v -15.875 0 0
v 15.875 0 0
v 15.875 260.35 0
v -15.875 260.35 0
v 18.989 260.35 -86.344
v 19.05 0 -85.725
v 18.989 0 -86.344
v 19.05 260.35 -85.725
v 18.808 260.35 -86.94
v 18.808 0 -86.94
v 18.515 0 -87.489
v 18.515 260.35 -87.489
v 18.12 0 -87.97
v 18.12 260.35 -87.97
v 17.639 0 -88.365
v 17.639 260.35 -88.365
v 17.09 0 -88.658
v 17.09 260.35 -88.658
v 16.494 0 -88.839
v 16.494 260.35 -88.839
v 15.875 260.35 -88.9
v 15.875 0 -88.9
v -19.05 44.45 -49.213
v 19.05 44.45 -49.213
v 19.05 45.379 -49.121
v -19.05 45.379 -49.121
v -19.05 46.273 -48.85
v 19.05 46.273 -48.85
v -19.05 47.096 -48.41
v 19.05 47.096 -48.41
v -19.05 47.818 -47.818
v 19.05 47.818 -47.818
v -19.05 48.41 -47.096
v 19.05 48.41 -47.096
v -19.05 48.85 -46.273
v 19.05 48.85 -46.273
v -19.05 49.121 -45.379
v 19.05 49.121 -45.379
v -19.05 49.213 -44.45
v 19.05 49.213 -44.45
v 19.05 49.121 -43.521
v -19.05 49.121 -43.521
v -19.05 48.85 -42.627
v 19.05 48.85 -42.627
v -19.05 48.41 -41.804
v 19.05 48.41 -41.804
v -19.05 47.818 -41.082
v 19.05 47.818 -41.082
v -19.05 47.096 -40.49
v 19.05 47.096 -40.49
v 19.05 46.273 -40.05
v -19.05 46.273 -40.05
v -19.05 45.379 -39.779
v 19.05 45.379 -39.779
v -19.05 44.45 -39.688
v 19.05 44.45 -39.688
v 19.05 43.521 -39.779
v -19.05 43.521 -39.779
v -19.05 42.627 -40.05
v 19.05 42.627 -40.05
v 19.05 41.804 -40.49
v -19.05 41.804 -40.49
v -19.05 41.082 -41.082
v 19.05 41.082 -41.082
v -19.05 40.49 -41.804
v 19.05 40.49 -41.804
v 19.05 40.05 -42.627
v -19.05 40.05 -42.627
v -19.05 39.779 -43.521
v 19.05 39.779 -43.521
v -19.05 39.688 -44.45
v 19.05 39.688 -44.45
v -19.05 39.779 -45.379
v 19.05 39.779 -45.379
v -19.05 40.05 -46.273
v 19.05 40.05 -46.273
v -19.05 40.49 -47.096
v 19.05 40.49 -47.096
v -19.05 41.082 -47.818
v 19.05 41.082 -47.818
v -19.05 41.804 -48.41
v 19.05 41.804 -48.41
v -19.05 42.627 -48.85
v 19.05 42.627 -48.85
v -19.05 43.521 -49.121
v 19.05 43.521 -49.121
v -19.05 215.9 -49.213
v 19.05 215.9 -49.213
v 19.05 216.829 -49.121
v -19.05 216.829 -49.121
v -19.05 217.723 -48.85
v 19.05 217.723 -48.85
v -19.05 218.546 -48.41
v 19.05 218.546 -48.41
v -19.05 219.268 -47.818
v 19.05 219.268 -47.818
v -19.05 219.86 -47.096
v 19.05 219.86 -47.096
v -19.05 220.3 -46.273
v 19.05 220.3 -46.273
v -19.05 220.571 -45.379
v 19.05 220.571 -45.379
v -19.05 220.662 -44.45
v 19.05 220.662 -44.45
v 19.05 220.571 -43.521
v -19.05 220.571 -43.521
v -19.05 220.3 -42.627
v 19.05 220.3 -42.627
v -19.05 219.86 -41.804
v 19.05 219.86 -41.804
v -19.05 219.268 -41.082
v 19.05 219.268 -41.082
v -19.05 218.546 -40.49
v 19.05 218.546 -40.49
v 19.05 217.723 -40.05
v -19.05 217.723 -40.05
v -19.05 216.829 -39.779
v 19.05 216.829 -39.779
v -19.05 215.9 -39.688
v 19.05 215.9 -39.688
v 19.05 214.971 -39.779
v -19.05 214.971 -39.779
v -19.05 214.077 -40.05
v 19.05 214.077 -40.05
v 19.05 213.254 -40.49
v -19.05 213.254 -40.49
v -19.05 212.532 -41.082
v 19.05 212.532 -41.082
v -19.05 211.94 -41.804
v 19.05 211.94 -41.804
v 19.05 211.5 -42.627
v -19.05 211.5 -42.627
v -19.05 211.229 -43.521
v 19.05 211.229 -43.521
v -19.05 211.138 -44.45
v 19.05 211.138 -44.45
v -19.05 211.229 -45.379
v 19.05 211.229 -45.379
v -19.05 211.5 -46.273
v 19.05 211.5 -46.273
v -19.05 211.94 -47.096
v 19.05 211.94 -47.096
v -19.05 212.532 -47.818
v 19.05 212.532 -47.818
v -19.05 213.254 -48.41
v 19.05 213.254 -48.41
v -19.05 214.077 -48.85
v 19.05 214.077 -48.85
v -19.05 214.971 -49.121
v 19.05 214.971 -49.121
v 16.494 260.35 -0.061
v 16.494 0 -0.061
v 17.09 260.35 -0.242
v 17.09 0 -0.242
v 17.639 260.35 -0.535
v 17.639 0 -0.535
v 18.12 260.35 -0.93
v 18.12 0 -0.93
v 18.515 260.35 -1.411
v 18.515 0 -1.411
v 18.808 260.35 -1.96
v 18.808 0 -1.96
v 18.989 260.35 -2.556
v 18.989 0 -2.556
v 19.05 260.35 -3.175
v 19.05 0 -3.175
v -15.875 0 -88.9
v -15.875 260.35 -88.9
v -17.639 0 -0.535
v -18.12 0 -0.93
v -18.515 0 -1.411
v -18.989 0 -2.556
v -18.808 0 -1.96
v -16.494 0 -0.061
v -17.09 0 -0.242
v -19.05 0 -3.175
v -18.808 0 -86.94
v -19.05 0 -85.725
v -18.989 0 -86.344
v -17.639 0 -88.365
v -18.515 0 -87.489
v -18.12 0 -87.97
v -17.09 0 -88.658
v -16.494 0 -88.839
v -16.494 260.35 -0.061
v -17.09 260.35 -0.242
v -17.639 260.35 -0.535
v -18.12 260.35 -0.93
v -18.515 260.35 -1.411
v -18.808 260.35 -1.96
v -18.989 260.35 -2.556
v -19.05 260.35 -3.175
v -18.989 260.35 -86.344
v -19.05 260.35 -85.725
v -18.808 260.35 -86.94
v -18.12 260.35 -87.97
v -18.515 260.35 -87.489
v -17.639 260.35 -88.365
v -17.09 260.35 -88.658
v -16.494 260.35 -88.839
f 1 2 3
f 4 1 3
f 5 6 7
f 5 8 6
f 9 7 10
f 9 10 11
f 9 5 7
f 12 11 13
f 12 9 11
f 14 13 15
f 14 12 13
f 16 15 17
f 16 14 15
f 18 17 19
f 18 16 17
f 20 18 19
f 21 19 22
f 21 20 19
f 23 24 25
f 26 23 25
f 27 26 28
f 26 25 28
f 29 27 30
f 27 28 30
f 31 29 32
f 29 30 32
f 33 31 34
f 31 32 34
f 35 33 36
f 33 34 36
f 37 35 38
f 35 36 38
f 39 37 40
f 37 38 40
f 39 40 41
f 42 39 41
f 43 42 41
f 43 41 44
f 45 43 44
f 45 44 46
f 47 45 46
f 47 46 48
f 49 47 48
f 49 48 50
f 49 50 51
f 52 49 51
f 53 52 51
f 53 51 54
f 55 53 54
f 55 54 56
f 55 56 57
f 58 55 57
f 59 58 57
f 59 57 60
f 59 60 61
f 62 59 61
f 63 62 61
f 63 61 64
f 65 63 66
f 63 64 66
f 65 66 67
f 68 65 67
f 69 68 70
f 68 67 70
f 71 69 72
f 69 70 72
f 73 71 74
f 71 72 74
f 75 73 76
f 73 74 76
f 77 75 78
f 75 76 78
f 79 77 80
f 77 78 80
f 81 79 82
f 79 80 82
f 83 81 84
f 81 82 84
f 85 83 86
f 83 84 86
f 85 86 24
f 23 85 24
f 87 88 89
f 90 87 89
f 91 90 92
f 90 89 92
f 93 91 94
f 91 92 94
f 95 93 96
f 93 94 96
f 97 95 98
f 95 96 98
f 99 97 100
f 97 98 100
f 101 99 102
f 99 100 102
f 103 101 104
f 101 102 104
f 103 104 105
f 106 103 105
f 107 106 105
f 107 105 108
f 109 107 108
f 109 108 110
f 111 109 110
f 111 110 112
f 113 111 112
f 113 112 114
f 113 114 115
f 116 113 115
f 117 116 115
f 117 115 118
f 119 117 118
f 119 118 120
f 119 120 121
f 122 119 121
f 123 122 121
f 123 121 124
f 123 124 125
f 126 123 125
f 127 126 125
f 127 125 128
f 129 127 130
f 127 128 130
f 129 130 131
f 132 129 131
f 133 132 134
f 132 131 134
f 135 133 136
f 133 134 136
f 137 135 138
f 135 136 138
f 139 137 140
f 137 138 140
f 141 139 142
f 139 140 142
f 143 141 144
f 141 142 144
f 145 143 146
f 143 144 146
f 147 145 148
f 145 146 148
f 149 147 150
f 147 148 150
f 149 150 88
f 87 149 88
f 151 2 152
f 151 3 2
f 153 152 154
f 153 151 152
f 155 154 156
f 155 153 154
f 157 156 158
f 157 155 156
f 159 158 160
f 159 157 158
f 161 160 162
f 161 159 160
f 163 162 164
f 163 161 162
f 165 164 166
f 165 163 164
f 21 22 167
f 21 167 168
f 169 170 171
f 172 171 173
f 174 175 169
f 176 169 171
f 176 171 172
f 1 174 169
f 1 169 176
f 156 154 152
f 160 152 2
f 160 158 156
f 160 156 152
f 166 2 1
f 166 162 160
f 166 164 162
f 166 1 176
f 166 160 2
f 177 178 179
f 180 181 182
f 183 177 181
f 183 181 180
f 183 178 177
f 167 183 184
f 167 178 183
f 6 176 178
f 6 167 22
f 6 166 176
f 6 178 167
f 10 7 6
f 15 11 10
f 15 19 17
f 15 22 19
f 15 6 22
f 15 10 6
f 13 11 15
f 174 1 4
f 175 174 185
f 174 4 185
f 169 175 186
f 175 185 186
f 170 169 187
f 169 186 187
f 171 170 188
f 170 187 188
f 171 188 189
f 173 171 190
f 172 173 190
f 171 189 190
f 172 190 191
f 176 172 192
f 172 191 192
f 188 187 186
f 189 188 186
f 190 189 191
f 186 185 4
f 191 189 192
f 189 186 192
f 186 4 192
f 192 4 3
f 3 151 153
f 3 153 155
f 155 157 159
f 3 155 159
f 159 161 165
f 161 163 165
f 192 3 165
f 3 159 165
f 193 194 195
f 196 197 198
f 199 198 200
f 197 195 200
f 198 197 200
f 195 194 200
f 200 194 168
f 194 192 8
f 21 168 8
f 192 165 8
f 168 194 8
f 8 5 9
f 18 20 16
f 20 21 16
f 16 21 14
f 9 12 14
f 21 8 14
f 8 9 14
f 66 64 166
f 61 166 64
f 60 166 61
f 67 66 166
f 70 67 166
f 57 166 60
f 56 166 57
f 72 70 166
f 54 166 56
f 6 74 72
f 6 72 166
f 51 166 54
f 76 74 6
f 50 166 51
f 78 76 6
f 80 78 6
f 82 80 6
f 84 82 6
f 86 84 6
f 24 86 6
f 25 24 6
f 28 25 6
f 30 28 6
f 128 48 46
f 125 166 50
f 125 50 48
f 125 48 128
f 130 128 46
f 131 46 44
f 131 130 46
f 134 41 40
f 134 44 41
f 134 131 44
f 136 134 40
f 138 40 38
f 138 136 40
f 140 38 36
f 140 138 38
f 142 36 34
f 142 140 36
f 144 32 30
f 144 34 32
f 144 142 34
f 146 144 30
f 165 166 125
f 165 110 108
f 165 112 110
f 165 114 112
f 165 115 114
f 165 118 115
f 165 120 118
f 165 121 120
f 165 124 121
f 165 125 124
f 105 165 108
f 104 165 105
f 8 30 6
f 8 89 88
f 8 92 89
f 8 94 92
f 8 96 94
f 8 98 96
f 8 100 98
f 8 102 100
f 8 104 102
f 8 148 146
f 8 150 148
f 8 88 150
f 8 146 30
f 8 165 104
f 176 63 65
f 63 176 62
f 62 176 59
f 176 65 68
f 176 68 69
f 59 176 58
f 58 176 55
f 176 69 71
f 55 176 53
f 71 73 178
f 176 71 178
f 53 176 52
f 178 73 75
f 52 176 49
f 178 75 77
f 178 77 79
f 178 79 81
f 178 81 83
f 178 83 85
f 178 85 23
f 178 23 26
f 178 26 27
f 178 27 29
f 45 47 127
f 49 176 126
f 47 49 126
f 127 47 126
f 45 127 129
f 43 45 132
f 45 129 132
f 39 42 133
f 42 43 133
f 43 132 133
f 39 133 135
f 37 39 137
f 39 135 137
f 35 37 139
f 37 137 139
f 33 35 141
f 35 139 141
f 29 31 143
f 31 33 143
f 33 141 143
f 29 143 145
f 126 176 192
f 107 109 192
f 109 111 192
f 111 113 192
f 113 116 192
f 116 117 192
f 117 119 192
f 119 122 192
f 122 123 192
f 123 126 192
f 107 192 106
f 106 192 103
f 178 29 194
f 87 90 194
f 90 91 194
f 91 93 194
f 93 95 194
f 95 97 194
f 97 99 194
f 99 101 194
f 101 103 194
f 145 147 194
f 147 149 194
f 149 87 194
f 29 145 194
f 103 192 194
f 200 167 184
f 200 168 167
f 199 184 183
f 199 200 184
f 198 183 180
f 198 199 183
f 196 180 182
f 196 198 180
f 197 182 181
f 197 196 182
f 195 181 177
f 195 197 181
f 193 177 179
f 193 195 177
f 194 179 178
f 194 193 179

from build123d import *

# Parameters (mm, degrees)
SKETCH1_W                  = 88.9
SKETCH1_H                  = 260.35
BOSS_EXTRUDE1_DEPTH        = 19.05
FILLET1_R                  = 3.175
F_3_8_0_3750_DOWEL_HOLE1_D = 9.525


with BuildPart() as part:
    # Sketch1 → Boss-Extrude1 (new, symmetric)
    with BuildSketch(Plane(origin=(0, 0, 0), x_dir=(0, 0, -1), z_dir=(1, 0, 0))):
        with Locations((44.45, 130.175)):
            Rectangle(SKETCH1_W, SKETCH1_H)
    extrude(amount=BOSS_EXTRUDE1_DEPTH, both=True)

    # Fillet1
    fillet1_edges = [part.edges().sort_by_distance(p)[0] for p in [
        (19.05, 130.175, 0),
        (-19.05, 130.175, 0),
        (-19.05, 130.175, -88.9),
        (19.05, 130.175, -88.9),
    ]]
    fillet(fillet1_edges, radius=FILLET1_R)

    # 3/8 (0.3750) Dowel Hole1 (through all)
    with Locations(Plane.ZY.offset(19.05)):
        with Locations((-44.45, 215.9), (-44.45, 44.45)):
            Hole(F_3_8_0_3750_DOWEL_HOLE1_D / 2)


solid = part.part
